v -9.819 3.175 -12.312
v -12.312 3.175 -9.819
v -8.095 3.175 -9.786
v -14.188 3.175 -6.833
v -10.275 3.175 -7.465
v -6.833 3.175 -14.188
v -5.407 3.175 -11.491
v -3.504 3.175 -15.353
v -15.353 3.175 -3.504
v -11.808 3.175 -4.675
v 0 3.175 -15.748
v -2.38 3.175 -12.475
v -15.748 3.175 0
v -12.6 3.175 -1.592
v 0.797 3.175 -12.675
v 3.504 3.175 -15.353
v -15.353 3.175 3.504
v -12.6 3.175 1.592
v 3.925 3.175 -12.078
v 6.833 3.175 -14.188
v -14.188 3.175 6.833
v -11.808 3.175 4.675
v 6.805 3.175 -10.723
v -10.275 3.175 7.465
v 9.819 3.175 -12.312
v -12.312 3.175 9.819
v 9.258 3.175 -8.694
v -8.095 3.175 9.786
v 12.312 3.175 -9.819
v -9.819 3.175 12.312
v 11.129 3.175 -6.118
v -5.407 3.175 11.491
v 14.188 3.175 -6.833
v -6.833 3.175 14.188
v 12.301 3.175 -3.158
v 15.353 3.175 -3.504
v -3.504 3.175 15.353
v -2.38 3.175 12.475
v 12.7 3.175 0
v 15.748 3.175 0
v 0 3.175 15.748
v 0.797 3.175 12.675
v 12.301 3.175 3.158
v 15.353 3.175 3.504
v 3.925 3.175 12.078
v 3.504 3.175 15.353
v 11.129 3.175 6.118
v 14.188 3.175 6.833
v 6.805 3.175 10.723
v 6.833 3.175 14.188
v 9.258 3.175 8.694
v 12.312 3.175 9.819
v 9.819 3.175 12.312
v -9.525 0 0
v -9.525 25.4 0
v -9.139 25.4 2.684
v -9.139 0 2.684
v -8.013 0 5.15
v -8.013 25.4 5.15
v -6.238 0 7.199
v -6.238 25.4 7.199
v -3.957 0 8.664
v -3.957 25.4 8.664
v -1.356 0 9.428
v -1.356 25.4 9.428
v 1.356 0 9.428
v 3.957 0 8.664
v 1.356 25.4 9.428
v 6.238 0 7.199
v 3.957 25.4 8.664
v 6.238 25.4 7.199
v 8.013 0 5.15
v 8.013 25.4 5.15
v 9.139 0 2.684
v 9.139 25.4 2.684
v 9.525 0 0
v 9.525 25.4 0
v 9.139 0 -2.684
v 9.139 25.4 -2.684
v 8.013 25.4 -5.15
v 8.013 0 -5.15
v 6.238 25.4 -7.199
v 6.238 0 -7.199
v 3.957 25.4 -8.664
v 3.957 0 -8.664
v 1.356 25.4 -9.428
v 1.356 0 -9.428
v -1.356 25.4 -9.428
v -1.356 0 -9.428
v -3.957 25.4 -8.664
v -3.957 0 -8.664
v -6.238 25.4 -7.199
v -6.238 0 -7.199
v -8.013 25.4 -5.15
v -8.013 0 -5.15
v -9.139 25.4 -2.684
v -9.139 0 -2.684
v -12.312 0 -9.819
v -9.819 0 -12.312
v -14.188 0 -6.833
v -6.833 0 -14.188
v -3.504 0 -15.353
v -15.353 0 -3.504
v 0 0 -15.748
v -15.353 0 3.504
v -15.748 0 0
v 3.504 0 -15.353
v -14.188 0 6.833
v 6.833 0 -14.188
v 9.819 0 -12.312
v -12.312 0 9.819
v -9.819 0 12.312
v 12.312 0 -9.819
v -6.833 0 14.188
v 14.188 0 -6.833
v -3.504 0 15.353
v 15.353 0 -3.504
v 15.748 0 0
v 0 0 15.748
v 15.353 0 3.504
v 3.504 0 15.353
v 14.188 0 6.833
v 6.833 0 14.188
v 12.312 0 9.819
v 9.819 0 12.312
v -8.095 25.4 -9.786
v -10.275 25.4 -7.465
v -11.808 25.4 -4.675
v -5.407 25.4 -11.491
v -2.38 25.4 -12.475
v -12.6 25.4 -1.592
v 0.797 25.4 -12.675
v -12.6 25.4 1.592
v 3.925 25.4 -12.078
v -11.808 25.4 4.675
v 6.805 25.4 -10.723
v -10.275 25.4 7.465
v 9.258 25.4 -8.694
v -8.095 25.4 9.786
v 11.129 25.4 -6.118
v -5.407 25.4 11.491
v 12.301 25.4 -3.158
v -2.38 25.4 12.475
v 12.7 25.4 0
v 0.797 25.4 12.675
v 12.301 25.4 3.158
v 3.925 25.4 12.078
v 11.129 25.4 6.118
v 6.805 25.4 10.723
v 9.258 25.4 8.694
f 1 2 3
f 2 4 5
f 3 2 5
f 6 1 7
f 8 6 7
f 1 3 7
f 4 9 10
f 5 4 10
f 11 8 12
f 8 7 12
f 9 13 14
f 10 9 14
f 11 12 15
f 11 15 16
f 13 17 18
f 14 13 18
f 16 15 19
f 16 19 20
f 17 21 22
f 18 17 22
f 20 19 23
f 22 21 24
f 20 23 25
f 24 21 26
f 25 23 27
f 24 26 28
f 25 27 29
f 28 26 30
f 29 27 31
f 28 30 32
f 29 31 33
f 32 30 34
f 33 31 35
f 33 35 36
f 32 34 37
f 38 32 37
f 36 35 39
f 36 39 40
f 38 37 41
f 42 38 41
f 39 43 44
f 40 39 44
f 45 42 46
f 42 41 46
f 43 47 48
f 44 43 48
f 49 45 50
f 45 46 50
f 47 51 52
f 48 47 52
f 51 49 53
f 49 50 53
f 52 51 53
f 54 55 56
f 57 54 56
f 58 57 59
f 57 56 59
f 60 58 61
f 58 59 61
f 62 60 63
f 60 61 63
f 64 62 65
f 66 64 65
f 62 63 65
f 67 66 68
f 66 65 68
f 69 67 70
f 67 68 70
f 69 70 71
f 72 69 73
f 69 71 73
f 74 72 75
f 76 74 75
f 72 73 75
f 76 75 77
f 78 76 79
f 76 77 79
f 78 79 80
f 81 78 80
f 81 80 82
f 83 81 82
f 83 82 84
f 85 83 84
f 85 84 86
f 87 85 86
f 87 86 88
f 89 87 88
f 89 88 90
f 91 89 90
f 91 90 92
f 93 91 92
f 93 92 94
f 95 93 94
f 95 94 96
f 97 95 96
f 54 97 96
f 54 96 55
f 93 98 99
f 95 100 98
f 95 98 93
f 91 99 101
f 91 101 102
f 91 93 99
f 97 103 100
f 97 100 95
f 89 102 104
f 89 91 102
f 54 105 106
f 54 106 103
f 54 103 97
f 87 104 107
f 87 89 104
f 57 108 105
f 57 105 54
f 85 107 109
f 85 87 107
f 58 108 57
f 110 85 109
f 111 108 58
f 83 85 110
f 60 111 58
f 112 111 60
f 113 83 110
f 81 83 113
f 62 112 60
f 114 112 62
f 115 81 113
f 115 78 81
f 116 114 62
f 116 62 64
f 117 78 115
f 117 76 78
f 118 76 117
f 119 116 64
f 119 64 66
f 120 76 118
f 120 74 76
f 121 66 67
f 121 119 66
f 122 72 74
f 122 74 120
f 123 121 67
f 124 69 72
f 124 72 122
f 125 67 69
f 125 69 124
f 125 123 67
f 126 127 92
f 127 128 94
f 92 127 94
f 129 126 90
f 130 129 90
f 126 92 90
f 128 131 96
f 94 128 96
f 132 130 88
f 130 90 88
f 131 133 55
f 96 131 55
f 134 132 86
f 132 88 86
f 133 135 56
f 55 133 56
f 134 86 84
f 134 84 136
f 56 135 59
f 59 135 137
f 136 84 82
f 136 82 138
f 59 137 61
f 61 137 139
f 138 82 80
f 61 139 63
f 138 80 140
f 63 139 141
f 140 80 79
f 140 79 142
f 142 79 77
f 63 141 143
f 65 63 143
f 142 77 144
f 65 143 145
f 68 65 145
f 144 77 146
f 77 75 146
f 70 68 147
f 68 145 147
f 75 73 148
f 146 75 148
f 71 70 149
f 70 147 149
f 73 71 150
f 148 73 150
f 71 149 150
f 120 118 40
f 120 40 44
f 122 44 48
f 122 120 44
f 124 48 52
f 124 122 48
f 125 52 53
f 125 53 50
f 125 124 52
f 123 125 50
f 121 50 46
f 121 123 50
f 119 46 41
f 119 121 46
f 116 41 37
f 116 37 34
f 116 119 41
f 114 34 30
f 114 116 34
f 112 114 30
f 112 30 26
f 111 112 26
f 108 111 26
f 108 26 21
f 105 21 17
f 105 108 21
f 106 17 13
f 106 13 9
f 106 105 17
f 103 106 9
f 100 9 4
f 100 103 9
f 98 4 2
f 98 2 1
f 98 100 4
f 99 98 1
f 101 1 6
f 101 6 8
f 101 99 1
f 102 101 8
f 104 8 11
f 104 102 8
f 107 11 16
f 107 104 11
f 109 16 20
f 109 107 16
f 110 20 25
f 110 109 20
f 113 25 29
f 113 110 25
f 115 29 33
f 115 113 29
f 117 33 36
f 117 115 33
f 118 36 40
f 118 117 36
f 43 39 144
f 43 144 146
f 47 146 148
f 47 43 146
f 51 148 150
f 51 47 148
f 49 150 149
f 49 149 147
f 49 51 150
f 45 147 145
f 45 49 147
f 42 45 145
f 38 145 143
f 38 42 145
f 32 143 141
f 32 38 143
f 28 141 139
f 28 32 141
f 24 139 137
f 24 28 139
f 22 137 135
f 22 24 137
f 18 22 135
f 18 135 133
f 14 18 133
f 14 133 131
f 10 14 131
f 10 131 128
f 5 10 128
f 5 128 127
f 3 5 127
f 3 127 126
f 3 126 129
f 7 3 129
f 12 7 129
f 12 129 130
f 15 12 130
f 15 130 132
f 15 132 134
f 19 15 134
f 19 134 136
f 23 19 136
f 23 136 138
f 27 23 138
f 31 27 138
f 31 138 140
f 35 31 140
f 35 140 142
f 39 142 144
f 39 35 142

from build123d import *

# Parameters (mm, degrees)
F0_R     = 15.748
F0_R_2   = 12.7
F1_DEPTH = 3.175
F2_DEPTH = 25.4
F3_D     = 19.05


with BuildPart() as f1:
    # F0 (on Front) → F1 (new body)
    with BuildSketch(Plane.XZ):
        Circle(F0_R)
        Circle(F0_R_2, mode=Mode.SUBTRACT)
        Circle(F0_R_2)
    extrude(amount=-F1_DEPTH)

    # F0 (on Front) → F2 (join)
    with BuildSketch(Plane.XZ):
        Circle(F0_R_2)
    extrude(amount=-F2_DEPTH)

    # F3 (through all)
    with Locations(Plane.XZ):
        with Locations((0, 0)):
            Hole(F3_D / 2)


solid = f1.part
